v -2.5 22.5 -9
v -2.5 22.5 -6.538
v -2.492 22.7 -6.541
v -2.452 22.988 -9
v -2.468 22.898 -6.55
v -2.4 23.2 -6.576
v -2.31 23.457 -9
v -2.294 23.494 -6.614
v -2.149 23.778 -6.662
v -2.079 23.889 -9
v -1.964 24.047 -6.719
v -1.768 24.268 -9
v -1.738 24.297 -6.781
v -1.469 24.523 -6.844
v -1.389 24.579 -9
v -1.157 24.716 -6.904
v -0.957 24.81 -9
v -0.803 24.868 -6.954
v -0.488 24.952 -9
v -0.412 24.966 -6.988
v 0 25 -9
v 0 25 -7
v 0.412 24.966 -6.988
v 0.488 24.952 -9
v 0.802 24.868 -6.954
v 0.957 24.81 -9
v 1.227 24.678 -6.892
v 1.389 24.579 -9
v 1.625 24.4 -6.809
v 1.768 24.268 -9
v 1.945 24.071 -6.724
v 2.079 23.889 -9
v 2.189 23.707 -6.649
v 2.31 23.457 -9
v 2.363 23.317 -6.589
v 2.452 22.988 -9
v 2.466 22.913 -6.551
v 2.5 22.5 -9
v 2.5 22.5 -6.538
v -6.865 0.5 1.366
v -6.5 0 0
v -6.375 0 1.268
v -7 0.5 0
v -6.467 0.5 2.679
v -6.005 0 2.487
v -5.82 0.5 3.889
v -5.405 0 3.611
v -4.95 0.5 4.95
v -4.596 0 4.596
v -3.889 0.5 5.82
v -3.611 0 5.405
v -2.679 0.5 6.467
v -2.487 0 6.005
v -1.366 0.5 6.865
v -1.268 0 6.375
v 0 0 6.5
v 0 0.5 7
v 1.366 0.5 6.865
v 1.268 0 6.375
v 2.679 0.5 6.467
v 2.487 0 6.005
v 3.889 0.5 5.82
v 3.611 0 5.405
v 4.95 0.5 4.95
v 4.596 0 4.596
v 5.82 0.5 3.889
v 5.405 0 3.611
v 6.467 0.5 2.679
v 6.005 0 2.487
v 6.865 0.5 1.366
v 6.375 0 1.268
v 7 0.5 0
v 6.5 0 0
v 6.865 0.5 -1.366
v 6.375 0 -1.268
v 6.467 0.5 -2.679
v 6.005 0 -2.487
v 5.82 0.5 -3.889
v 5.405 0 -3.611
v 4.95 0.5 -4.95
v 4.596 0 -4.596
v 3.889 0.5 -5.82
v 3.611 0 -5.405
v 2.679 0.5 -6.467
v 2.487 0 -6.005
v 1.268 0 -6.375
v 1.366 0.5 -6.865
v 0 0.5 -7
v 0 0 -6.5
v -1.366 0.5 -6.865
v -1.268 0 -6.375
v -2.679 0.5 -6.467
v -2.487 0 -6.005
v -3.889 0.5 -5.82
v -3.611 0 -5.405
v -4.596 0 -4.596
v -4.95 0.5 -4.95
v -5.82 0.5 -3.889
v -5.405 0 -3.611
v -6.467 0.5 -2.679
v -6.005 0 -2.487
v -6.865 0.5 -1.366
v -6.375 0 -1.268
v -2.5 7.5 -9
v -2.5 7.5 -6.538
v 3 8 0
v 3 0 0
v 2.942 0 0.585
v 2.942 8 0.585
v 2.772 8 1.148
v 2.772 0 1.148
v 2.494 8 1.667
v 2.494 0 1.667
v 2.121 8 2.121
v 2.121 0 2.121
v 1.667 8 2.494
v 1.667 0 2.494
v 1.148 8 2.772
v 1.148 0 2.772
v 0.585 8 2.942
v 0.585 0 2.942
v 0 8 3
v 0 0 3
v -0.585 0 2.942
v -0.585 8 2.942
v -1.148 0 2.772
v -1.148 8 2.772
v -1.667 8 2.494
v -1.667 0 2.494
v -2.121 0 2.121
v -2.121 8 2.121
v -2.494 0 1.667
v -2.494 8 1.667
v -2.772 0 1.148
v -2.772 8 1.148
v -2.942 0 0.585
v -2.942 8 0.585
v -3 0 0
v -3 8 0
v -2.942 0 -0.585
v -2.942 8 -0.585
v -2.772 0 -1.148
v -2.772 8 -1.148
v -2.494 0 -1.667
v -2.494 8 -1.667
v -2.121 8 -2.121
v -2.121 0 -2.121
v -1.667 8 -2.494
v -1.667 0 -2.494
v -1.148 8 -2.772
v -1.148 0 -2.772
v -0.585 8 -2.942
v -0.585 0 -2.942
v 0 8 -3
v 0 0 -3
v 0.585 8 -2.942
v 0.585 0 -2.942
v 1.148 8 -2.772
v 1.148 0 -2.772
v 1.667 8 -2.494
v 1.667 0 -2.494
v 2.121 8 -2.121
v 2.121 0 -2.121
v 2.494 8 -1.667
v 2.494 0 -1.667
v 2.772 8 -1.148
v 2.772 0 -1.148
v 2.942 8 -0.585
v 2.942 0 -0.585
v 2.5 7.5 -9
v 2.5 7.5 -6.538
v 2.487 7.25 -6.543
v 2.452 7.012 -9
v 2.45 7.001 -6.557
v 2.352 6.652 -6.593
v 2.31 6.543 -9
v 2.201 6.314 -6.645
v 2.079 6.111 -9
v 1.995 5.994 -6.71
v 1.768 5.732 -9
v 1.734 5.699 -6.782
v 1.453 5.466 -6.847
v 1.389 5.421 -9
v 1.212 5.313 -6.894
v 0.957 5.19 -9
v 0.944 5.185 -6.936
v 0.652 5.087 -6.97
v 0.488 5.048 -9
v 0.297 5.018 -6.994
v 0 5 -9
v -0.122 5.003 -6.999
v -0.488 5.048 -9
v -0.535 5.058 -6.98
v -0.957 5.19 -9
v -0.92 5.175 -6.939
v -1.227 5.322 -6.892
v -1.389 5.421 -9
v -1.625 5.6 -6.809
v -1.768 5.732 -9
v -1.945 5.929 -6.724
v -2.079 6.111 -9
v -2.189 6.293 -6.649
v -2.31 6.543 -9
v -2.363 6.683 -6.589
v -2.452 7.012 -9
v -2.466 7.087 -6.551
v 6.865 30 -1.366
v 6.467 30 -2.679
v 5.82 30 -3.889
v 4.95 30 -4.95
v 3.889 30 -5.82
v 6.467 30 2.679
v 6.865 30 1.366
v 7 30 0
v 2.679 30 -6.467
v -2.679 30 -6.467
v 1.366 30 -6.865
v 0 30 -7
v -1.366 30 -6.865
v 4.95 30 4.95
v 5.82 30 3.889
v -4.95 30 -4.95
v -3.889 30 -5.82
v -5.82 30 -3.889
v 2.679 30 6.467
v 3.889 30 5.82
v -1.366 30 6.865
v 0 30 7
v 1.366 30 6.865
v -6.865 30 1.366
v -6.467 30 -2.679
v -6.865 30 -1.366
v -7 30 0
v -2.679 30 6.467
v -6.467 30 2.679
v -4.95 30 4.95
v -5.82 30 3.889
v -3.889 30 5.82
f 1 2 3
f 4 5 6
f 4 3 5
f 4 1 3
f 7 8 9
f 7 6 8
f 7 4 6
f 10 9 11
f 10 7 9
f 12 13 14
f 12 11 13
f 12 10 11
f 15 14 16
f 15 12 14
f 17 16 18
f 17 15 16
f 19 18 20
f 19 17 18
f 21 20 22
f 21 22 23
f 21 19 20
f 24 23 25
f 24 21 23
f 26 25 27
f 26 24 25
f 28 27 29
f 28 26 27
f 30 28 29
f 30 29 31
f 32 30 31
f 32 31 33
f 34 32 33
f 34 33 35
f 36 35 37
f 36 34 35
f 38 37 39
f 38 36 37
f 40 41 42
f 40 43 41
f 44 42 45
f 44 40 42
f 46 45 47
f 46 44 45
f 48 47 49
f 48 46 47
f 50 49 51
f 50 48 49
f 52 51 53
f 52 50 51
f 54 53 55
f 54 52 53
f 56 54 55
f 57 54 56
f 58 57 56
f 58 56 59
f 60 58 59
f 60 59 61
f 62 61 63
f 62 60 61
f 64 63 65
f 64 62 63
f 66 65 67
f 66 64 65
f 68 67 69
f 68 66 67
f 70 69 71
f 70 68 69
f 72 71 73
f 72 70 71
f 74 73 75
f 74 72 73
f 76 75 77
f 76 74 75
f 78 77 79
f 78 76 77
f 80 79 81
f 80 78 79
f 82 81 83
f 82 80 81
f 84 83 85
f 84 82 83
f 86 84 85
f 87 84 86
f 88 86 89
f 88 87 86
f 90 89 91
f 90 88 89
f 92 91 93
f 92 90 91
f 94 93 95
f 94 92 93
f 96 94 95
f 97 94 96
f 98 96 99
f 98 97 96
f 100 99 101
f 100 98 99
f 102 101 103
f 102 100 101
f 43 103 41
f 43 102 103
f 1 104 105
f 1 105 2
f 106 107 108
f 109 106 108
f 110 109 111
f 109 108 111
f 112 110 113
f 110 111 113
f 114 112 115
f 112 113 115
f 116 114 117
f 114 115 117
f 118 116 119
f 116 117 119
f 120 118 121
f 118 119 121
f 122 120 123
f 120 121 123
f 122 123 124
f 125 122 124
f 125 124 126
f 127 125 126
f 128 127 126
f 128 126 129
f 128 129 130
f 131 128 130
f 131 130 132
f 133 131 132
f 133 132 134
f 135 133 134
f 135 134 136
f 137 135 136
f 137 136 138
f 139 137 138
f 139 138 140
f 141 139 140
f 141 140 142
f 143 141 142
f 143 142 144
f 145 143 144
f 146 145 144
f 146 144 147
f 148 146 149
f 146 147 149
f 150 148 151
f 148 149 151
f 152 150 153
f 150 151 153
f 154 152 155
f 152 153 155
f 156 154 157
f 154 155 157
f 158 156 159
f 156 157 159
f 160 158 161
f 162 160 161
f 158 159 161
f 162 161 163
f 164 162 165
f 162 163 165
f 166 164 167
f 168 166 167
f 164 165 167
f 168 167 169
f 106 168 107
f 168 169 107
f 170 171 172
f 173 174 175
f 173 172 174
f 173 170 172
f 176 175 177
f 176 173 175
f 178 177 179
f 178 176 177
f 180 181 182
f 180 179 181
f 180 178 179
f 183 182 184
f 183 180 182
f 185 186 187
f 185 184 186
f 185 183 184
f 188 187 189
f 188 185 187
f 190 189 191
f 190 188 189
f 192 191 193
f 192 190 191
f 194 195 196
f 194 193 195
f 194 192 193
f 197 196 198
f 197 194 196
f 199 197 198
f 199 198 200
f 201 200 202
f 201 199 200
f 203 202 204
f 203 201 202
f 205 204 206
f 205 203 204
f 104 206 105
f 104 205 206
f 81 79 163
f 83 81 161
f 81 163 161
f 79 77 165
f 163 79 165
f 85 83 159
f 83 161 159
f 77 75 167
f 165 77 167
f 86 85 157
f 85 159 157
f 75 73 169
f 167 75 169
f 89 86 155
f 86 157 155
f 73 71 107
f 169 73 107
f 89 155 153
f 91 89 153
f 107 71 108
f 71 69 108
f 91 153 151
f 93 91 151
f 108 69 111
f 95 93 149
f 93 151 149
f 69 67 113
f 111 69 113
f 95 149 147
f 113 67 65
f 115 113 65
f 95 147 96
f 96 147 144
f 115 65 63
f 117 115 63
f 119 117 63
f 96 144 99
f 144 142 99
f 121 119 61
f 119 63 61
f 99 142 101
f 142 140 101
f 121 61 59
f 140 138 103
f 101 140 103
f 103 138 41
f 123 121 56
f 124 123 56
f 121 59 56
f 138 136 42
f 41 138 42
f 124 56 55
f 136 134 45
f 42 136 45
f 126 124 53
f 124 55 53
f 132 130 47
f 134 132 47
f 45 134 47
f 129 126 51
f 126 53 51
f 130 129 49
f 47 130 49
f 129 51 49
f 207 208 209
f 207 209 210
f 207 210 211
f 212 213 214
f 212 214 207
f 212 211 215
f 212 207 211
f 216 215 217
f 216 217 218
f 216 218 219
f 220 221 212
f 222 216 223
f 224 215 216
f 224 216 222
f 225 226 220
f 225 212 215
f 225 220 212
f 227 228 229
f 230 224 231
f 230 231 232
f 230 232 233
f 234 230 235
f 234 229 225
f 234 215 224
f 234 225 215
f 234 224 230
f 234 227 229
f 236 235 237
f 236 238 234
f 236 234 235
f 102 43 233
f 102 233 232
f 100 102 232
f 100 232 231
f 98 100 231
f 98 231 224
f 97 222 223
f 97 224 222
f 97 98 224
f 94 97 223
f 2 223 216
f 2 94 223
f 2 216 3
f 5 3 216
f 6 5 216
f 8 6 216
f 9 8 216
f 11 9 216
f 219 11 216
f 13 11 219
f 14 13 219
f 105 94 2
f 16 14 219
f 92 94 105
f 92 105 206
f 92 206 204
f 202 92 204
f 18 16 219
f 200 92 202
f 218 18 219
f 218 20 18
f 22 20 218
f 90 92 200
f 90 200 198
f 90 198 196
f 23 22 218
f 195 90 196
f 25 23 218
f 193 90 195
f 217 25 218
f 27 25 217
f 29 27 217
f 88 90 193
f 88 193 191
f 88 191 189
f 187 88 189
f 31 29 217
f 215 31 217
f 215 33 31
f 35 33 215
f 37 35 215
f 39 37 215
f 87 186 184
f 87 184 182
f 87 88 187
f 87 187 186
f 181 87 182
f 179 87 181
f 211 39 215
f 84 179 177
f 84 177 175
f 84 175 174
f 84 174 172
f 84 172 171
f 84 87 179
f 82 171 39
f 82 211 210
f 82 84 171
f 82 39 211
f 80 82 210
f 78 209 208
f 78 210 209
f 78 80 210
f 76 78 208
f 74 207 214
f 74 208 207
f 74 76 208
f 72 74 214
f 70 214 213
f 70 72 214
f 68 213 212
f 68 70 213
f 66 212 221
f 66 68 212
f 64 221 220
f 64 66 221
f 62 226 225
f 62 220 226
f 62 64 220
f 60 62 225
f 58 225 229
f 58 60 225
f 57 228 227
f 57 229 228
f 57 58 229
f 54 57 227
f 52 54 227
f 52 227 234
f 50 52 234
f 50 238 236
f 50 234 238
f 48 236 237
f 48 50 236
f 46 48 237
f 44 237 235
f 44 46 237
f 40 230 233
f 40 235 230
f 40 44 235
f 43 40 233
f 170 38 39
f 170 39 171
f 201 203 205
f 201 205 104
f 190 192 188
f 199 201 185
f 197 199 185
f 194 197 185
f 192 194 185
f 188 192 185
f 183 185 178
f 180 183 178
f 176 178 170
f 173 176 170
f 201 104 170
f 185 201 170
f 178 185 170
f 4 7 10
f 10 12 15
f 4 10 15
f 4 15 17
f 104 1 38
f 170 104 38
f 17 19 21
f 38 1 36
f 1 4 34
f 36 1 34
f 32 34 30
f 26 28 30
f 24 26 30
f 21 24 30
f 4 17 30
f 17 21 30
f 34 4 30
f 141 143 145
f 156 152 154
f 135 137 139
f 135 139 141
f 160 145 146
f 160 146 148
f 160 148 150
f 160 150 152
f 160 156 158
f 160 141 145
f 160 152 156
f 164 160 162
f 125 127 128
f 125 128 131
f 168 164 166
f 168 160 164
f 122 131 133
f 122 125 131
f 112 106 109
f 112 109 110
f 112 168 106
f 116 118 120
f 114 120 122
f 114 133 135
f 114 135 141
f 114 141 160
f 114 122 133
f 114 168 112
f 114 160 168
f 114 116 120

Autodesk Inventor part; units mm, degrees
ref_plane "YZ Plane" through (0, 0, 0) normal (1, 0, 0) x (0, 1, 0)
ref_plane "XZ Plane" through (0, 0, 0) normal (0, 1, 0) x (-1, 0, 0)
sketch "Sketch1" plane through (0, 0, 0) normal (0, 1, 0) x (-1, 0, 0)
  circle A0 centre (0, 0) radius 7
  dimension "d0" = 14
extrude "Extrusion1" add sketch "Sketch1" along normal blind 30
sketch "Sketch2" plane through (0, 0, 0) normal (0, -1, 0) x (1, 0, 0)
  point P0 (0, 0)
ref_plane "Work Plane1" through (0, 0, -7) normal (0, 0, 1) x (1, 0, 0)
sketch "Sketch3" plane through (0, 0, -7) normal (0, 0, 1) x (1, 0, 0)
  line L0 (0, 5) -> (0, 5)
  line L1 (-2.5, 7.5) -> (-2.5, 22.5)
  line L2 (0, 25) -> (0, 25)
  line L3 (2.5, 22.5) -> (2.5, 7.5)
  line L4 (7, 0) -> (-7, 0) projected
  arc A0 (0, 5) -> (2.5, 7.5) centre (0, 7.5) ccw
  arc A1 (-2.5, 7.5) -> (0, 5) centre (0, 7.5) ccw
  arc A2 (0, 25) -> (-2.5, 22.5) centre (0, 22.5) ccw
  arc A3 (2.5, 22.5) -> (0, 25) centre (0, 22.5) ccw
  point P0 (0, 0)
  point P1 (2.5, 5)
  point P2 (2.5, 25)
  point P3 (0, 5)
  point P4 (0, 25)
  dimension "d3" = 5
  dimension "d4" = 20
  dimension "d5" = 5
  dimension "d6" = 2.5
  dimension "d7" = 2.5
extrude "Extrusion2" add sketch "Sketch3" along normal blind 1 and the other way blind 2
sketch "Sketch4" plane through (0, 0, 0) normal (0, -1, 0) x (1, 0, 0)
  circle A0 centre (0, 0) radius 3
  dimension "d12" = 6
extrude "Extrusion3" cut sketch "Sketch4" against normal blind 8
chamfer "Chamfer1" distance 0.5 angle 45 1 edges at (7, 0, 0)
thread "Thread1" size "M6x1" class "6H" standard "ANSI Metric M Profile" length 60
properties part number "inputshaft nmrv50"
